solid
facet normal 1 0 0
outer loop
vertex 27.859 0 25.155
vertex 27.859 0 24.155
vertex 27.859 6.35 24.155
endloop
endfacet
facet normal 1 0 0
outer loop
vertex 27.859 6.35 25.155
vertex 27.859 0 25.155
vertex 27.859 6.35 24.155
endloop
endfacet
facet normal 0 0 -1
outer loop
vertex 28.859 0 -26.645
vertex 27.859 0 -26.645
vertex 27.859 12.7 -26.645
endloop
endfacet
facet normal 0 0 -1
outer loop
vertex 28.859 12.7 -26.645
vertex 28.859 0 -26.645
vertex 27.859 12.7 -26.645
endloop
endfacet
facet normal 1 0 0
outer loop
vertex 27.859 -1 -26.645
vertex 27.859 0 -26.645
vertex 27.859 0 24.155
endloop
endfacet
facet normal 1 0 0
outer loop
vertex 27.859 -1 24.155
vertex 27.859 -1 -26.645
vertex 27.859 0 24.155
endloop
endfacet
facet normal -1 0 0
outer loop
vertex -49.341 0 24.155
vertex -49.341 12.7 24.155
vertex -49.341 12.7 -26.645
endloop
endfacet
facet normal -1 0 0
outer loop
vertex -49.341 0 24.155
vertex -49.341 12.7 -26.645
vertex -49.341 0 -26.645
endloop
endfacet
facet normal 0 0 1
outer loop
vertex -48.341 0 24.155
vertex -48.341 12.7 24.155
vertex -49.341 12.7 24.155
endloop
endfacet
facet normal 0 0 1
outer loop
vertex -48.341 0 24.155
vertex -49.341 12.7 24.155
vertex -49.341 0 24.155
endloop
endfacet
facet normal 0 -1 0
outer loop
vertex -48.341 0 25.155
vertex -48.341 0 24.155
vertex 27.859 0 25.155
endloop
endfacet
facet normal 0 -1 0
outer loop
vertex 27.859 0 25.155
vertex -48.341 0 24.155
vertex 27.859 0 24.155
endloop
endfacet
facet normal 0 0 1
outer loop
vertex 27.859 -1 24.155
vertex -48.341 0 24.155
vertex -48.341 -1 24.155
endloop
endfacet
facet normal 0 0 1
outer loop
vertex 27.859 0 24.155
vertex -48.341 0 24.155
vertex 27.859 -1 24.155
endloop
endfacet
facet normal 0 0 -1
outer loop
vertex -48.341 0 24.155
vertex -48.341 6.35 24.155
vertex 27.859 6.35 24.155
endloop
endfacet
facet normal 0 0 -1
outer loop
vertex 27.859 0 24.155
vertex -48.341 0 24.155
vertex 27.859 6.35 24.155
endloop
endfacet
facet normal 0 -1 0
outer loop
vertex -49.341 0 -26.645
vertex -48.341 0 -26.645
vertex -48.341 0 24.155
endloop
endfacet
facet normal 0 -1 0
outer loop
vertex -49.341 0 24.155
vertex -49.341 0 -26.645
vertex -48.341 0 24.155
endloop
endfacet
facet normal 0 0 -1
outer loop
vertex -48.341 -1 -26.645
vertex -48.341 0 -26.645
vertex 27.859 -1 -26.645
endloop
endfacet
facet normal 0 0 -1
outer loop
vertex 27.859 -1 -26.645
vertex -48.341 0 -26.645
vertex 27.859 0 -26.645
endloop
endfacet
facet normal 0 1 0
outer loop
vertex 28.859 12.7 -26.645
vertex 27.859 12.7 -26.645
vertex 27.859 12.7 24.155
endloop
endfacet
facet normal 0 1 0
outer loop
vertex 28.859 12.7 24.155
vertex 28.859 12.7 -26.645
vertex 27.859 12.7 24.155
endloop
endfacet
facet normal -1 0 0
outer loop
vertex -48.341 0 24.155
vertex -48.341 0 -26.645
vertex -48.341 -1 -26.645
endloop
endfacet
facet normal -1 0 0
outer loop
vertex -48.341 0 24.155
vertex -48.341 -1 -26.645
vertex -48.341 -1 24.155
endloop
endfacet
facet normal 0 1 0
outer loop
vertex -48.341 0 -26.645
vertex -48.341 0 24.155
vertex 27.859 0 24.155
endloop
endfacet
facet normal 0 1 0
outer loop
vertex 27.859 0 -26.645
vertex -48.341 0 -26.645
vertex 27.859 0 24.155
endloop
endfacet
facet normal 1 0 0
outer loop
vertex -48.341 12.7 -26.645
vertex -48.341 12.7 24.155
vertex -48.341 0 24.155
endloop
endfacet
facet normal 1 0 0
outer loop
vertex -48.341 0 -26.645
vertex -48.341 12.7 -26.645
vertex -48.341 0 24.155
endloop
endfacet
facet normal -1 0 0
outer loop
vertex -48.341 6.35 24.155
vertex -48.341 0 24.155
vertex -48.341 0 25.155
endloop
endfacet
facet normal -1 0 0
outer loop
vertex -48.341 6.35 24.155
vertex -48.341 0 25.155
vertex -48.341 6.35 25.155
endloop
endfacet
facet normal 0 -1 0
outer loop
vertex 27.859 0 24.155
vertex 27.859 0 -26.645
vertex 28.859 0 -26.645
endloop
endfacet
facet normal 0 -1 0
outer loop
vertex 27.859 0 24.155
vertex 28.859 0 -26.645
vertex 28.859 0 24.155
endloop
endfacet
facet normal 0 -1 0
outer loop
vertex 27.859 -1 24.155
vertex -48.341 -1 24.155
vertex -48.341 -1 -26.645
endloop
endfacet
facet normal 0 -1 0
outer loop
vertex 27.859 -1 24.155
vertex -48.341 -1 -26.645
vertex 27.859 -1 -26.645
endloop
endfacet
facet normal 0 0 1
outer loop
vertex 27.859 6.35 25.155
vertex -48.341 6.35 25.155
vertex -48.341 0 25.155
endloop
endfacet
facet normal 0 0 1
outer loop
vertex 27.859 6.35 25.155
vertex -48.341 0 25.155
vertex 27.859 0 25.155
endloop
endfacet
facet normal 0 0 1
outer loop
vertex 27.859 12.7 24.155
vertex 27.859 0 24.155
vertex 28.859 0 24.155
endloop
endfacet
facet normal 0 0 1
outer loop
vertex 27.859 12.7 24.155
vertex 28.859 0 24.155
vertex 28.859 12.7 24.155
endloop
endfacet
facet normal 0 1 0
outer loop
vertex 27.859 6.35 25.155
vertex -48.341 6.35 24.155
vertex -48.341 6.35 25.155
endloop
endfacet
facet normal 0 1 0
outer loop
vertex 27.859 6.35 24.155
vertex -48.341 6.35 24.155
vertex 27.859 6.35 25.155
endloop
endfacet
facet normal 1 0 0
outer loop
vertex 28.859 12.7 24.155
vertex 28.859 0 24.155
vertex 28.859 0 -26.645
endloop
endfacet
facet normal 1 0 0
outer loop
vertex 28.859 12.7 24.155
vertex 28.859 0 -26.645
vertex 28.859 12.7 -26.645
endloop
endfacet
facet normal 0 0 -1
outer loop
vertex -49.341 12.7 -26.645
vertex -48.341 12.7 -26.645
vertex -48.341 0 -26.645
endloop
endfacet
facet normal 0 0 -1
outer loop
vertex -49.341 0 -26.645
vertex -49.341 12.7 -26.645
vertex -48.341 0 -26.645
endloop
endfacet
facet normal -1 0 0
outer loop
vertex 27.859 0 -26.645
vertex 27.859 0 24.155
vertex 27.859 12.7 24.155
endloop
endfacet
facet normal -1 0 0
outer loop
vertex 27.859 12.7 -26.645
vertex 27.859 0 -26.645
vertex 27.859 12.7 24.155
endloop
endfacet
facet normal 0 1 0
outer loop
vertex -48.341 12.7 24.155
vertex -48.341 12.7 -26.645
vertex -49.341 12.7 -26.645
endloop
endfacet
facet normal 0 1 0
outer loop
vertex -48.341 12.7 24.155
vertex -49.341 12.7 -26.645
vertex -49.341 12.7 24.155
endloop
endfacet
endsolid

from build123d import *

# Parameters (mm, degrees)
F0_W     = 76.2
F0_H     = 50.8
F1_DEPTH = 1
F2_W     = 12.7
F2_H     = 50.8
F3_DEPTH = 1
F4_W     = 12.7
F4_H     = 50.8
F5_DEPTH = 1
F6_W     = 76.2
F6_H     = 6.35
F7_DEPTH = 1


with BuildPart() as f1:
    # F0 (on Front) → F1 (new body)
    with BuildSketch(Plane.XZ):
        with Locations((-10.240782, -1.244969)):
            Rectangle(F0_W, F0_H)
    extrude(amount=F1_DEPTH)


with BuildPart() as f3:
    # F2 (on face) → F3 (new body)
    with BuildSketch(Plane.YZ.offset(27.859218)):
        with Locations((6.35, -1.244969)):
            Rectangle(F2_W, F2_H)
    extrude(amount=F3_DEPTH)


with BuildPart() as f5:
    # F4 (on face) → F5 (new body)
    with BuildSketch(Plane(origin=(-48.340782, 0, 0), x_dir=(0, -1, 0), z_dir=(-1, 0, 0))):
        with Locations((-6.35, -1.244969)):
            Rectangle(F4_W, F4_H)
    extrude(amount=F5_DEPTH)


with BuildPart() as f7:
    # F6 (on face) → F7 (new body)
    with BuildSketch(Plane.XY.offset(24.155031)):
        with Locations((-10.240782, 3.175)):
            Rectangle(F6_W, F6_H)
    extrude(amount=F7_DEPTH)


solid = Compound([f1.part, f3.part, f5.part, f7.part])
